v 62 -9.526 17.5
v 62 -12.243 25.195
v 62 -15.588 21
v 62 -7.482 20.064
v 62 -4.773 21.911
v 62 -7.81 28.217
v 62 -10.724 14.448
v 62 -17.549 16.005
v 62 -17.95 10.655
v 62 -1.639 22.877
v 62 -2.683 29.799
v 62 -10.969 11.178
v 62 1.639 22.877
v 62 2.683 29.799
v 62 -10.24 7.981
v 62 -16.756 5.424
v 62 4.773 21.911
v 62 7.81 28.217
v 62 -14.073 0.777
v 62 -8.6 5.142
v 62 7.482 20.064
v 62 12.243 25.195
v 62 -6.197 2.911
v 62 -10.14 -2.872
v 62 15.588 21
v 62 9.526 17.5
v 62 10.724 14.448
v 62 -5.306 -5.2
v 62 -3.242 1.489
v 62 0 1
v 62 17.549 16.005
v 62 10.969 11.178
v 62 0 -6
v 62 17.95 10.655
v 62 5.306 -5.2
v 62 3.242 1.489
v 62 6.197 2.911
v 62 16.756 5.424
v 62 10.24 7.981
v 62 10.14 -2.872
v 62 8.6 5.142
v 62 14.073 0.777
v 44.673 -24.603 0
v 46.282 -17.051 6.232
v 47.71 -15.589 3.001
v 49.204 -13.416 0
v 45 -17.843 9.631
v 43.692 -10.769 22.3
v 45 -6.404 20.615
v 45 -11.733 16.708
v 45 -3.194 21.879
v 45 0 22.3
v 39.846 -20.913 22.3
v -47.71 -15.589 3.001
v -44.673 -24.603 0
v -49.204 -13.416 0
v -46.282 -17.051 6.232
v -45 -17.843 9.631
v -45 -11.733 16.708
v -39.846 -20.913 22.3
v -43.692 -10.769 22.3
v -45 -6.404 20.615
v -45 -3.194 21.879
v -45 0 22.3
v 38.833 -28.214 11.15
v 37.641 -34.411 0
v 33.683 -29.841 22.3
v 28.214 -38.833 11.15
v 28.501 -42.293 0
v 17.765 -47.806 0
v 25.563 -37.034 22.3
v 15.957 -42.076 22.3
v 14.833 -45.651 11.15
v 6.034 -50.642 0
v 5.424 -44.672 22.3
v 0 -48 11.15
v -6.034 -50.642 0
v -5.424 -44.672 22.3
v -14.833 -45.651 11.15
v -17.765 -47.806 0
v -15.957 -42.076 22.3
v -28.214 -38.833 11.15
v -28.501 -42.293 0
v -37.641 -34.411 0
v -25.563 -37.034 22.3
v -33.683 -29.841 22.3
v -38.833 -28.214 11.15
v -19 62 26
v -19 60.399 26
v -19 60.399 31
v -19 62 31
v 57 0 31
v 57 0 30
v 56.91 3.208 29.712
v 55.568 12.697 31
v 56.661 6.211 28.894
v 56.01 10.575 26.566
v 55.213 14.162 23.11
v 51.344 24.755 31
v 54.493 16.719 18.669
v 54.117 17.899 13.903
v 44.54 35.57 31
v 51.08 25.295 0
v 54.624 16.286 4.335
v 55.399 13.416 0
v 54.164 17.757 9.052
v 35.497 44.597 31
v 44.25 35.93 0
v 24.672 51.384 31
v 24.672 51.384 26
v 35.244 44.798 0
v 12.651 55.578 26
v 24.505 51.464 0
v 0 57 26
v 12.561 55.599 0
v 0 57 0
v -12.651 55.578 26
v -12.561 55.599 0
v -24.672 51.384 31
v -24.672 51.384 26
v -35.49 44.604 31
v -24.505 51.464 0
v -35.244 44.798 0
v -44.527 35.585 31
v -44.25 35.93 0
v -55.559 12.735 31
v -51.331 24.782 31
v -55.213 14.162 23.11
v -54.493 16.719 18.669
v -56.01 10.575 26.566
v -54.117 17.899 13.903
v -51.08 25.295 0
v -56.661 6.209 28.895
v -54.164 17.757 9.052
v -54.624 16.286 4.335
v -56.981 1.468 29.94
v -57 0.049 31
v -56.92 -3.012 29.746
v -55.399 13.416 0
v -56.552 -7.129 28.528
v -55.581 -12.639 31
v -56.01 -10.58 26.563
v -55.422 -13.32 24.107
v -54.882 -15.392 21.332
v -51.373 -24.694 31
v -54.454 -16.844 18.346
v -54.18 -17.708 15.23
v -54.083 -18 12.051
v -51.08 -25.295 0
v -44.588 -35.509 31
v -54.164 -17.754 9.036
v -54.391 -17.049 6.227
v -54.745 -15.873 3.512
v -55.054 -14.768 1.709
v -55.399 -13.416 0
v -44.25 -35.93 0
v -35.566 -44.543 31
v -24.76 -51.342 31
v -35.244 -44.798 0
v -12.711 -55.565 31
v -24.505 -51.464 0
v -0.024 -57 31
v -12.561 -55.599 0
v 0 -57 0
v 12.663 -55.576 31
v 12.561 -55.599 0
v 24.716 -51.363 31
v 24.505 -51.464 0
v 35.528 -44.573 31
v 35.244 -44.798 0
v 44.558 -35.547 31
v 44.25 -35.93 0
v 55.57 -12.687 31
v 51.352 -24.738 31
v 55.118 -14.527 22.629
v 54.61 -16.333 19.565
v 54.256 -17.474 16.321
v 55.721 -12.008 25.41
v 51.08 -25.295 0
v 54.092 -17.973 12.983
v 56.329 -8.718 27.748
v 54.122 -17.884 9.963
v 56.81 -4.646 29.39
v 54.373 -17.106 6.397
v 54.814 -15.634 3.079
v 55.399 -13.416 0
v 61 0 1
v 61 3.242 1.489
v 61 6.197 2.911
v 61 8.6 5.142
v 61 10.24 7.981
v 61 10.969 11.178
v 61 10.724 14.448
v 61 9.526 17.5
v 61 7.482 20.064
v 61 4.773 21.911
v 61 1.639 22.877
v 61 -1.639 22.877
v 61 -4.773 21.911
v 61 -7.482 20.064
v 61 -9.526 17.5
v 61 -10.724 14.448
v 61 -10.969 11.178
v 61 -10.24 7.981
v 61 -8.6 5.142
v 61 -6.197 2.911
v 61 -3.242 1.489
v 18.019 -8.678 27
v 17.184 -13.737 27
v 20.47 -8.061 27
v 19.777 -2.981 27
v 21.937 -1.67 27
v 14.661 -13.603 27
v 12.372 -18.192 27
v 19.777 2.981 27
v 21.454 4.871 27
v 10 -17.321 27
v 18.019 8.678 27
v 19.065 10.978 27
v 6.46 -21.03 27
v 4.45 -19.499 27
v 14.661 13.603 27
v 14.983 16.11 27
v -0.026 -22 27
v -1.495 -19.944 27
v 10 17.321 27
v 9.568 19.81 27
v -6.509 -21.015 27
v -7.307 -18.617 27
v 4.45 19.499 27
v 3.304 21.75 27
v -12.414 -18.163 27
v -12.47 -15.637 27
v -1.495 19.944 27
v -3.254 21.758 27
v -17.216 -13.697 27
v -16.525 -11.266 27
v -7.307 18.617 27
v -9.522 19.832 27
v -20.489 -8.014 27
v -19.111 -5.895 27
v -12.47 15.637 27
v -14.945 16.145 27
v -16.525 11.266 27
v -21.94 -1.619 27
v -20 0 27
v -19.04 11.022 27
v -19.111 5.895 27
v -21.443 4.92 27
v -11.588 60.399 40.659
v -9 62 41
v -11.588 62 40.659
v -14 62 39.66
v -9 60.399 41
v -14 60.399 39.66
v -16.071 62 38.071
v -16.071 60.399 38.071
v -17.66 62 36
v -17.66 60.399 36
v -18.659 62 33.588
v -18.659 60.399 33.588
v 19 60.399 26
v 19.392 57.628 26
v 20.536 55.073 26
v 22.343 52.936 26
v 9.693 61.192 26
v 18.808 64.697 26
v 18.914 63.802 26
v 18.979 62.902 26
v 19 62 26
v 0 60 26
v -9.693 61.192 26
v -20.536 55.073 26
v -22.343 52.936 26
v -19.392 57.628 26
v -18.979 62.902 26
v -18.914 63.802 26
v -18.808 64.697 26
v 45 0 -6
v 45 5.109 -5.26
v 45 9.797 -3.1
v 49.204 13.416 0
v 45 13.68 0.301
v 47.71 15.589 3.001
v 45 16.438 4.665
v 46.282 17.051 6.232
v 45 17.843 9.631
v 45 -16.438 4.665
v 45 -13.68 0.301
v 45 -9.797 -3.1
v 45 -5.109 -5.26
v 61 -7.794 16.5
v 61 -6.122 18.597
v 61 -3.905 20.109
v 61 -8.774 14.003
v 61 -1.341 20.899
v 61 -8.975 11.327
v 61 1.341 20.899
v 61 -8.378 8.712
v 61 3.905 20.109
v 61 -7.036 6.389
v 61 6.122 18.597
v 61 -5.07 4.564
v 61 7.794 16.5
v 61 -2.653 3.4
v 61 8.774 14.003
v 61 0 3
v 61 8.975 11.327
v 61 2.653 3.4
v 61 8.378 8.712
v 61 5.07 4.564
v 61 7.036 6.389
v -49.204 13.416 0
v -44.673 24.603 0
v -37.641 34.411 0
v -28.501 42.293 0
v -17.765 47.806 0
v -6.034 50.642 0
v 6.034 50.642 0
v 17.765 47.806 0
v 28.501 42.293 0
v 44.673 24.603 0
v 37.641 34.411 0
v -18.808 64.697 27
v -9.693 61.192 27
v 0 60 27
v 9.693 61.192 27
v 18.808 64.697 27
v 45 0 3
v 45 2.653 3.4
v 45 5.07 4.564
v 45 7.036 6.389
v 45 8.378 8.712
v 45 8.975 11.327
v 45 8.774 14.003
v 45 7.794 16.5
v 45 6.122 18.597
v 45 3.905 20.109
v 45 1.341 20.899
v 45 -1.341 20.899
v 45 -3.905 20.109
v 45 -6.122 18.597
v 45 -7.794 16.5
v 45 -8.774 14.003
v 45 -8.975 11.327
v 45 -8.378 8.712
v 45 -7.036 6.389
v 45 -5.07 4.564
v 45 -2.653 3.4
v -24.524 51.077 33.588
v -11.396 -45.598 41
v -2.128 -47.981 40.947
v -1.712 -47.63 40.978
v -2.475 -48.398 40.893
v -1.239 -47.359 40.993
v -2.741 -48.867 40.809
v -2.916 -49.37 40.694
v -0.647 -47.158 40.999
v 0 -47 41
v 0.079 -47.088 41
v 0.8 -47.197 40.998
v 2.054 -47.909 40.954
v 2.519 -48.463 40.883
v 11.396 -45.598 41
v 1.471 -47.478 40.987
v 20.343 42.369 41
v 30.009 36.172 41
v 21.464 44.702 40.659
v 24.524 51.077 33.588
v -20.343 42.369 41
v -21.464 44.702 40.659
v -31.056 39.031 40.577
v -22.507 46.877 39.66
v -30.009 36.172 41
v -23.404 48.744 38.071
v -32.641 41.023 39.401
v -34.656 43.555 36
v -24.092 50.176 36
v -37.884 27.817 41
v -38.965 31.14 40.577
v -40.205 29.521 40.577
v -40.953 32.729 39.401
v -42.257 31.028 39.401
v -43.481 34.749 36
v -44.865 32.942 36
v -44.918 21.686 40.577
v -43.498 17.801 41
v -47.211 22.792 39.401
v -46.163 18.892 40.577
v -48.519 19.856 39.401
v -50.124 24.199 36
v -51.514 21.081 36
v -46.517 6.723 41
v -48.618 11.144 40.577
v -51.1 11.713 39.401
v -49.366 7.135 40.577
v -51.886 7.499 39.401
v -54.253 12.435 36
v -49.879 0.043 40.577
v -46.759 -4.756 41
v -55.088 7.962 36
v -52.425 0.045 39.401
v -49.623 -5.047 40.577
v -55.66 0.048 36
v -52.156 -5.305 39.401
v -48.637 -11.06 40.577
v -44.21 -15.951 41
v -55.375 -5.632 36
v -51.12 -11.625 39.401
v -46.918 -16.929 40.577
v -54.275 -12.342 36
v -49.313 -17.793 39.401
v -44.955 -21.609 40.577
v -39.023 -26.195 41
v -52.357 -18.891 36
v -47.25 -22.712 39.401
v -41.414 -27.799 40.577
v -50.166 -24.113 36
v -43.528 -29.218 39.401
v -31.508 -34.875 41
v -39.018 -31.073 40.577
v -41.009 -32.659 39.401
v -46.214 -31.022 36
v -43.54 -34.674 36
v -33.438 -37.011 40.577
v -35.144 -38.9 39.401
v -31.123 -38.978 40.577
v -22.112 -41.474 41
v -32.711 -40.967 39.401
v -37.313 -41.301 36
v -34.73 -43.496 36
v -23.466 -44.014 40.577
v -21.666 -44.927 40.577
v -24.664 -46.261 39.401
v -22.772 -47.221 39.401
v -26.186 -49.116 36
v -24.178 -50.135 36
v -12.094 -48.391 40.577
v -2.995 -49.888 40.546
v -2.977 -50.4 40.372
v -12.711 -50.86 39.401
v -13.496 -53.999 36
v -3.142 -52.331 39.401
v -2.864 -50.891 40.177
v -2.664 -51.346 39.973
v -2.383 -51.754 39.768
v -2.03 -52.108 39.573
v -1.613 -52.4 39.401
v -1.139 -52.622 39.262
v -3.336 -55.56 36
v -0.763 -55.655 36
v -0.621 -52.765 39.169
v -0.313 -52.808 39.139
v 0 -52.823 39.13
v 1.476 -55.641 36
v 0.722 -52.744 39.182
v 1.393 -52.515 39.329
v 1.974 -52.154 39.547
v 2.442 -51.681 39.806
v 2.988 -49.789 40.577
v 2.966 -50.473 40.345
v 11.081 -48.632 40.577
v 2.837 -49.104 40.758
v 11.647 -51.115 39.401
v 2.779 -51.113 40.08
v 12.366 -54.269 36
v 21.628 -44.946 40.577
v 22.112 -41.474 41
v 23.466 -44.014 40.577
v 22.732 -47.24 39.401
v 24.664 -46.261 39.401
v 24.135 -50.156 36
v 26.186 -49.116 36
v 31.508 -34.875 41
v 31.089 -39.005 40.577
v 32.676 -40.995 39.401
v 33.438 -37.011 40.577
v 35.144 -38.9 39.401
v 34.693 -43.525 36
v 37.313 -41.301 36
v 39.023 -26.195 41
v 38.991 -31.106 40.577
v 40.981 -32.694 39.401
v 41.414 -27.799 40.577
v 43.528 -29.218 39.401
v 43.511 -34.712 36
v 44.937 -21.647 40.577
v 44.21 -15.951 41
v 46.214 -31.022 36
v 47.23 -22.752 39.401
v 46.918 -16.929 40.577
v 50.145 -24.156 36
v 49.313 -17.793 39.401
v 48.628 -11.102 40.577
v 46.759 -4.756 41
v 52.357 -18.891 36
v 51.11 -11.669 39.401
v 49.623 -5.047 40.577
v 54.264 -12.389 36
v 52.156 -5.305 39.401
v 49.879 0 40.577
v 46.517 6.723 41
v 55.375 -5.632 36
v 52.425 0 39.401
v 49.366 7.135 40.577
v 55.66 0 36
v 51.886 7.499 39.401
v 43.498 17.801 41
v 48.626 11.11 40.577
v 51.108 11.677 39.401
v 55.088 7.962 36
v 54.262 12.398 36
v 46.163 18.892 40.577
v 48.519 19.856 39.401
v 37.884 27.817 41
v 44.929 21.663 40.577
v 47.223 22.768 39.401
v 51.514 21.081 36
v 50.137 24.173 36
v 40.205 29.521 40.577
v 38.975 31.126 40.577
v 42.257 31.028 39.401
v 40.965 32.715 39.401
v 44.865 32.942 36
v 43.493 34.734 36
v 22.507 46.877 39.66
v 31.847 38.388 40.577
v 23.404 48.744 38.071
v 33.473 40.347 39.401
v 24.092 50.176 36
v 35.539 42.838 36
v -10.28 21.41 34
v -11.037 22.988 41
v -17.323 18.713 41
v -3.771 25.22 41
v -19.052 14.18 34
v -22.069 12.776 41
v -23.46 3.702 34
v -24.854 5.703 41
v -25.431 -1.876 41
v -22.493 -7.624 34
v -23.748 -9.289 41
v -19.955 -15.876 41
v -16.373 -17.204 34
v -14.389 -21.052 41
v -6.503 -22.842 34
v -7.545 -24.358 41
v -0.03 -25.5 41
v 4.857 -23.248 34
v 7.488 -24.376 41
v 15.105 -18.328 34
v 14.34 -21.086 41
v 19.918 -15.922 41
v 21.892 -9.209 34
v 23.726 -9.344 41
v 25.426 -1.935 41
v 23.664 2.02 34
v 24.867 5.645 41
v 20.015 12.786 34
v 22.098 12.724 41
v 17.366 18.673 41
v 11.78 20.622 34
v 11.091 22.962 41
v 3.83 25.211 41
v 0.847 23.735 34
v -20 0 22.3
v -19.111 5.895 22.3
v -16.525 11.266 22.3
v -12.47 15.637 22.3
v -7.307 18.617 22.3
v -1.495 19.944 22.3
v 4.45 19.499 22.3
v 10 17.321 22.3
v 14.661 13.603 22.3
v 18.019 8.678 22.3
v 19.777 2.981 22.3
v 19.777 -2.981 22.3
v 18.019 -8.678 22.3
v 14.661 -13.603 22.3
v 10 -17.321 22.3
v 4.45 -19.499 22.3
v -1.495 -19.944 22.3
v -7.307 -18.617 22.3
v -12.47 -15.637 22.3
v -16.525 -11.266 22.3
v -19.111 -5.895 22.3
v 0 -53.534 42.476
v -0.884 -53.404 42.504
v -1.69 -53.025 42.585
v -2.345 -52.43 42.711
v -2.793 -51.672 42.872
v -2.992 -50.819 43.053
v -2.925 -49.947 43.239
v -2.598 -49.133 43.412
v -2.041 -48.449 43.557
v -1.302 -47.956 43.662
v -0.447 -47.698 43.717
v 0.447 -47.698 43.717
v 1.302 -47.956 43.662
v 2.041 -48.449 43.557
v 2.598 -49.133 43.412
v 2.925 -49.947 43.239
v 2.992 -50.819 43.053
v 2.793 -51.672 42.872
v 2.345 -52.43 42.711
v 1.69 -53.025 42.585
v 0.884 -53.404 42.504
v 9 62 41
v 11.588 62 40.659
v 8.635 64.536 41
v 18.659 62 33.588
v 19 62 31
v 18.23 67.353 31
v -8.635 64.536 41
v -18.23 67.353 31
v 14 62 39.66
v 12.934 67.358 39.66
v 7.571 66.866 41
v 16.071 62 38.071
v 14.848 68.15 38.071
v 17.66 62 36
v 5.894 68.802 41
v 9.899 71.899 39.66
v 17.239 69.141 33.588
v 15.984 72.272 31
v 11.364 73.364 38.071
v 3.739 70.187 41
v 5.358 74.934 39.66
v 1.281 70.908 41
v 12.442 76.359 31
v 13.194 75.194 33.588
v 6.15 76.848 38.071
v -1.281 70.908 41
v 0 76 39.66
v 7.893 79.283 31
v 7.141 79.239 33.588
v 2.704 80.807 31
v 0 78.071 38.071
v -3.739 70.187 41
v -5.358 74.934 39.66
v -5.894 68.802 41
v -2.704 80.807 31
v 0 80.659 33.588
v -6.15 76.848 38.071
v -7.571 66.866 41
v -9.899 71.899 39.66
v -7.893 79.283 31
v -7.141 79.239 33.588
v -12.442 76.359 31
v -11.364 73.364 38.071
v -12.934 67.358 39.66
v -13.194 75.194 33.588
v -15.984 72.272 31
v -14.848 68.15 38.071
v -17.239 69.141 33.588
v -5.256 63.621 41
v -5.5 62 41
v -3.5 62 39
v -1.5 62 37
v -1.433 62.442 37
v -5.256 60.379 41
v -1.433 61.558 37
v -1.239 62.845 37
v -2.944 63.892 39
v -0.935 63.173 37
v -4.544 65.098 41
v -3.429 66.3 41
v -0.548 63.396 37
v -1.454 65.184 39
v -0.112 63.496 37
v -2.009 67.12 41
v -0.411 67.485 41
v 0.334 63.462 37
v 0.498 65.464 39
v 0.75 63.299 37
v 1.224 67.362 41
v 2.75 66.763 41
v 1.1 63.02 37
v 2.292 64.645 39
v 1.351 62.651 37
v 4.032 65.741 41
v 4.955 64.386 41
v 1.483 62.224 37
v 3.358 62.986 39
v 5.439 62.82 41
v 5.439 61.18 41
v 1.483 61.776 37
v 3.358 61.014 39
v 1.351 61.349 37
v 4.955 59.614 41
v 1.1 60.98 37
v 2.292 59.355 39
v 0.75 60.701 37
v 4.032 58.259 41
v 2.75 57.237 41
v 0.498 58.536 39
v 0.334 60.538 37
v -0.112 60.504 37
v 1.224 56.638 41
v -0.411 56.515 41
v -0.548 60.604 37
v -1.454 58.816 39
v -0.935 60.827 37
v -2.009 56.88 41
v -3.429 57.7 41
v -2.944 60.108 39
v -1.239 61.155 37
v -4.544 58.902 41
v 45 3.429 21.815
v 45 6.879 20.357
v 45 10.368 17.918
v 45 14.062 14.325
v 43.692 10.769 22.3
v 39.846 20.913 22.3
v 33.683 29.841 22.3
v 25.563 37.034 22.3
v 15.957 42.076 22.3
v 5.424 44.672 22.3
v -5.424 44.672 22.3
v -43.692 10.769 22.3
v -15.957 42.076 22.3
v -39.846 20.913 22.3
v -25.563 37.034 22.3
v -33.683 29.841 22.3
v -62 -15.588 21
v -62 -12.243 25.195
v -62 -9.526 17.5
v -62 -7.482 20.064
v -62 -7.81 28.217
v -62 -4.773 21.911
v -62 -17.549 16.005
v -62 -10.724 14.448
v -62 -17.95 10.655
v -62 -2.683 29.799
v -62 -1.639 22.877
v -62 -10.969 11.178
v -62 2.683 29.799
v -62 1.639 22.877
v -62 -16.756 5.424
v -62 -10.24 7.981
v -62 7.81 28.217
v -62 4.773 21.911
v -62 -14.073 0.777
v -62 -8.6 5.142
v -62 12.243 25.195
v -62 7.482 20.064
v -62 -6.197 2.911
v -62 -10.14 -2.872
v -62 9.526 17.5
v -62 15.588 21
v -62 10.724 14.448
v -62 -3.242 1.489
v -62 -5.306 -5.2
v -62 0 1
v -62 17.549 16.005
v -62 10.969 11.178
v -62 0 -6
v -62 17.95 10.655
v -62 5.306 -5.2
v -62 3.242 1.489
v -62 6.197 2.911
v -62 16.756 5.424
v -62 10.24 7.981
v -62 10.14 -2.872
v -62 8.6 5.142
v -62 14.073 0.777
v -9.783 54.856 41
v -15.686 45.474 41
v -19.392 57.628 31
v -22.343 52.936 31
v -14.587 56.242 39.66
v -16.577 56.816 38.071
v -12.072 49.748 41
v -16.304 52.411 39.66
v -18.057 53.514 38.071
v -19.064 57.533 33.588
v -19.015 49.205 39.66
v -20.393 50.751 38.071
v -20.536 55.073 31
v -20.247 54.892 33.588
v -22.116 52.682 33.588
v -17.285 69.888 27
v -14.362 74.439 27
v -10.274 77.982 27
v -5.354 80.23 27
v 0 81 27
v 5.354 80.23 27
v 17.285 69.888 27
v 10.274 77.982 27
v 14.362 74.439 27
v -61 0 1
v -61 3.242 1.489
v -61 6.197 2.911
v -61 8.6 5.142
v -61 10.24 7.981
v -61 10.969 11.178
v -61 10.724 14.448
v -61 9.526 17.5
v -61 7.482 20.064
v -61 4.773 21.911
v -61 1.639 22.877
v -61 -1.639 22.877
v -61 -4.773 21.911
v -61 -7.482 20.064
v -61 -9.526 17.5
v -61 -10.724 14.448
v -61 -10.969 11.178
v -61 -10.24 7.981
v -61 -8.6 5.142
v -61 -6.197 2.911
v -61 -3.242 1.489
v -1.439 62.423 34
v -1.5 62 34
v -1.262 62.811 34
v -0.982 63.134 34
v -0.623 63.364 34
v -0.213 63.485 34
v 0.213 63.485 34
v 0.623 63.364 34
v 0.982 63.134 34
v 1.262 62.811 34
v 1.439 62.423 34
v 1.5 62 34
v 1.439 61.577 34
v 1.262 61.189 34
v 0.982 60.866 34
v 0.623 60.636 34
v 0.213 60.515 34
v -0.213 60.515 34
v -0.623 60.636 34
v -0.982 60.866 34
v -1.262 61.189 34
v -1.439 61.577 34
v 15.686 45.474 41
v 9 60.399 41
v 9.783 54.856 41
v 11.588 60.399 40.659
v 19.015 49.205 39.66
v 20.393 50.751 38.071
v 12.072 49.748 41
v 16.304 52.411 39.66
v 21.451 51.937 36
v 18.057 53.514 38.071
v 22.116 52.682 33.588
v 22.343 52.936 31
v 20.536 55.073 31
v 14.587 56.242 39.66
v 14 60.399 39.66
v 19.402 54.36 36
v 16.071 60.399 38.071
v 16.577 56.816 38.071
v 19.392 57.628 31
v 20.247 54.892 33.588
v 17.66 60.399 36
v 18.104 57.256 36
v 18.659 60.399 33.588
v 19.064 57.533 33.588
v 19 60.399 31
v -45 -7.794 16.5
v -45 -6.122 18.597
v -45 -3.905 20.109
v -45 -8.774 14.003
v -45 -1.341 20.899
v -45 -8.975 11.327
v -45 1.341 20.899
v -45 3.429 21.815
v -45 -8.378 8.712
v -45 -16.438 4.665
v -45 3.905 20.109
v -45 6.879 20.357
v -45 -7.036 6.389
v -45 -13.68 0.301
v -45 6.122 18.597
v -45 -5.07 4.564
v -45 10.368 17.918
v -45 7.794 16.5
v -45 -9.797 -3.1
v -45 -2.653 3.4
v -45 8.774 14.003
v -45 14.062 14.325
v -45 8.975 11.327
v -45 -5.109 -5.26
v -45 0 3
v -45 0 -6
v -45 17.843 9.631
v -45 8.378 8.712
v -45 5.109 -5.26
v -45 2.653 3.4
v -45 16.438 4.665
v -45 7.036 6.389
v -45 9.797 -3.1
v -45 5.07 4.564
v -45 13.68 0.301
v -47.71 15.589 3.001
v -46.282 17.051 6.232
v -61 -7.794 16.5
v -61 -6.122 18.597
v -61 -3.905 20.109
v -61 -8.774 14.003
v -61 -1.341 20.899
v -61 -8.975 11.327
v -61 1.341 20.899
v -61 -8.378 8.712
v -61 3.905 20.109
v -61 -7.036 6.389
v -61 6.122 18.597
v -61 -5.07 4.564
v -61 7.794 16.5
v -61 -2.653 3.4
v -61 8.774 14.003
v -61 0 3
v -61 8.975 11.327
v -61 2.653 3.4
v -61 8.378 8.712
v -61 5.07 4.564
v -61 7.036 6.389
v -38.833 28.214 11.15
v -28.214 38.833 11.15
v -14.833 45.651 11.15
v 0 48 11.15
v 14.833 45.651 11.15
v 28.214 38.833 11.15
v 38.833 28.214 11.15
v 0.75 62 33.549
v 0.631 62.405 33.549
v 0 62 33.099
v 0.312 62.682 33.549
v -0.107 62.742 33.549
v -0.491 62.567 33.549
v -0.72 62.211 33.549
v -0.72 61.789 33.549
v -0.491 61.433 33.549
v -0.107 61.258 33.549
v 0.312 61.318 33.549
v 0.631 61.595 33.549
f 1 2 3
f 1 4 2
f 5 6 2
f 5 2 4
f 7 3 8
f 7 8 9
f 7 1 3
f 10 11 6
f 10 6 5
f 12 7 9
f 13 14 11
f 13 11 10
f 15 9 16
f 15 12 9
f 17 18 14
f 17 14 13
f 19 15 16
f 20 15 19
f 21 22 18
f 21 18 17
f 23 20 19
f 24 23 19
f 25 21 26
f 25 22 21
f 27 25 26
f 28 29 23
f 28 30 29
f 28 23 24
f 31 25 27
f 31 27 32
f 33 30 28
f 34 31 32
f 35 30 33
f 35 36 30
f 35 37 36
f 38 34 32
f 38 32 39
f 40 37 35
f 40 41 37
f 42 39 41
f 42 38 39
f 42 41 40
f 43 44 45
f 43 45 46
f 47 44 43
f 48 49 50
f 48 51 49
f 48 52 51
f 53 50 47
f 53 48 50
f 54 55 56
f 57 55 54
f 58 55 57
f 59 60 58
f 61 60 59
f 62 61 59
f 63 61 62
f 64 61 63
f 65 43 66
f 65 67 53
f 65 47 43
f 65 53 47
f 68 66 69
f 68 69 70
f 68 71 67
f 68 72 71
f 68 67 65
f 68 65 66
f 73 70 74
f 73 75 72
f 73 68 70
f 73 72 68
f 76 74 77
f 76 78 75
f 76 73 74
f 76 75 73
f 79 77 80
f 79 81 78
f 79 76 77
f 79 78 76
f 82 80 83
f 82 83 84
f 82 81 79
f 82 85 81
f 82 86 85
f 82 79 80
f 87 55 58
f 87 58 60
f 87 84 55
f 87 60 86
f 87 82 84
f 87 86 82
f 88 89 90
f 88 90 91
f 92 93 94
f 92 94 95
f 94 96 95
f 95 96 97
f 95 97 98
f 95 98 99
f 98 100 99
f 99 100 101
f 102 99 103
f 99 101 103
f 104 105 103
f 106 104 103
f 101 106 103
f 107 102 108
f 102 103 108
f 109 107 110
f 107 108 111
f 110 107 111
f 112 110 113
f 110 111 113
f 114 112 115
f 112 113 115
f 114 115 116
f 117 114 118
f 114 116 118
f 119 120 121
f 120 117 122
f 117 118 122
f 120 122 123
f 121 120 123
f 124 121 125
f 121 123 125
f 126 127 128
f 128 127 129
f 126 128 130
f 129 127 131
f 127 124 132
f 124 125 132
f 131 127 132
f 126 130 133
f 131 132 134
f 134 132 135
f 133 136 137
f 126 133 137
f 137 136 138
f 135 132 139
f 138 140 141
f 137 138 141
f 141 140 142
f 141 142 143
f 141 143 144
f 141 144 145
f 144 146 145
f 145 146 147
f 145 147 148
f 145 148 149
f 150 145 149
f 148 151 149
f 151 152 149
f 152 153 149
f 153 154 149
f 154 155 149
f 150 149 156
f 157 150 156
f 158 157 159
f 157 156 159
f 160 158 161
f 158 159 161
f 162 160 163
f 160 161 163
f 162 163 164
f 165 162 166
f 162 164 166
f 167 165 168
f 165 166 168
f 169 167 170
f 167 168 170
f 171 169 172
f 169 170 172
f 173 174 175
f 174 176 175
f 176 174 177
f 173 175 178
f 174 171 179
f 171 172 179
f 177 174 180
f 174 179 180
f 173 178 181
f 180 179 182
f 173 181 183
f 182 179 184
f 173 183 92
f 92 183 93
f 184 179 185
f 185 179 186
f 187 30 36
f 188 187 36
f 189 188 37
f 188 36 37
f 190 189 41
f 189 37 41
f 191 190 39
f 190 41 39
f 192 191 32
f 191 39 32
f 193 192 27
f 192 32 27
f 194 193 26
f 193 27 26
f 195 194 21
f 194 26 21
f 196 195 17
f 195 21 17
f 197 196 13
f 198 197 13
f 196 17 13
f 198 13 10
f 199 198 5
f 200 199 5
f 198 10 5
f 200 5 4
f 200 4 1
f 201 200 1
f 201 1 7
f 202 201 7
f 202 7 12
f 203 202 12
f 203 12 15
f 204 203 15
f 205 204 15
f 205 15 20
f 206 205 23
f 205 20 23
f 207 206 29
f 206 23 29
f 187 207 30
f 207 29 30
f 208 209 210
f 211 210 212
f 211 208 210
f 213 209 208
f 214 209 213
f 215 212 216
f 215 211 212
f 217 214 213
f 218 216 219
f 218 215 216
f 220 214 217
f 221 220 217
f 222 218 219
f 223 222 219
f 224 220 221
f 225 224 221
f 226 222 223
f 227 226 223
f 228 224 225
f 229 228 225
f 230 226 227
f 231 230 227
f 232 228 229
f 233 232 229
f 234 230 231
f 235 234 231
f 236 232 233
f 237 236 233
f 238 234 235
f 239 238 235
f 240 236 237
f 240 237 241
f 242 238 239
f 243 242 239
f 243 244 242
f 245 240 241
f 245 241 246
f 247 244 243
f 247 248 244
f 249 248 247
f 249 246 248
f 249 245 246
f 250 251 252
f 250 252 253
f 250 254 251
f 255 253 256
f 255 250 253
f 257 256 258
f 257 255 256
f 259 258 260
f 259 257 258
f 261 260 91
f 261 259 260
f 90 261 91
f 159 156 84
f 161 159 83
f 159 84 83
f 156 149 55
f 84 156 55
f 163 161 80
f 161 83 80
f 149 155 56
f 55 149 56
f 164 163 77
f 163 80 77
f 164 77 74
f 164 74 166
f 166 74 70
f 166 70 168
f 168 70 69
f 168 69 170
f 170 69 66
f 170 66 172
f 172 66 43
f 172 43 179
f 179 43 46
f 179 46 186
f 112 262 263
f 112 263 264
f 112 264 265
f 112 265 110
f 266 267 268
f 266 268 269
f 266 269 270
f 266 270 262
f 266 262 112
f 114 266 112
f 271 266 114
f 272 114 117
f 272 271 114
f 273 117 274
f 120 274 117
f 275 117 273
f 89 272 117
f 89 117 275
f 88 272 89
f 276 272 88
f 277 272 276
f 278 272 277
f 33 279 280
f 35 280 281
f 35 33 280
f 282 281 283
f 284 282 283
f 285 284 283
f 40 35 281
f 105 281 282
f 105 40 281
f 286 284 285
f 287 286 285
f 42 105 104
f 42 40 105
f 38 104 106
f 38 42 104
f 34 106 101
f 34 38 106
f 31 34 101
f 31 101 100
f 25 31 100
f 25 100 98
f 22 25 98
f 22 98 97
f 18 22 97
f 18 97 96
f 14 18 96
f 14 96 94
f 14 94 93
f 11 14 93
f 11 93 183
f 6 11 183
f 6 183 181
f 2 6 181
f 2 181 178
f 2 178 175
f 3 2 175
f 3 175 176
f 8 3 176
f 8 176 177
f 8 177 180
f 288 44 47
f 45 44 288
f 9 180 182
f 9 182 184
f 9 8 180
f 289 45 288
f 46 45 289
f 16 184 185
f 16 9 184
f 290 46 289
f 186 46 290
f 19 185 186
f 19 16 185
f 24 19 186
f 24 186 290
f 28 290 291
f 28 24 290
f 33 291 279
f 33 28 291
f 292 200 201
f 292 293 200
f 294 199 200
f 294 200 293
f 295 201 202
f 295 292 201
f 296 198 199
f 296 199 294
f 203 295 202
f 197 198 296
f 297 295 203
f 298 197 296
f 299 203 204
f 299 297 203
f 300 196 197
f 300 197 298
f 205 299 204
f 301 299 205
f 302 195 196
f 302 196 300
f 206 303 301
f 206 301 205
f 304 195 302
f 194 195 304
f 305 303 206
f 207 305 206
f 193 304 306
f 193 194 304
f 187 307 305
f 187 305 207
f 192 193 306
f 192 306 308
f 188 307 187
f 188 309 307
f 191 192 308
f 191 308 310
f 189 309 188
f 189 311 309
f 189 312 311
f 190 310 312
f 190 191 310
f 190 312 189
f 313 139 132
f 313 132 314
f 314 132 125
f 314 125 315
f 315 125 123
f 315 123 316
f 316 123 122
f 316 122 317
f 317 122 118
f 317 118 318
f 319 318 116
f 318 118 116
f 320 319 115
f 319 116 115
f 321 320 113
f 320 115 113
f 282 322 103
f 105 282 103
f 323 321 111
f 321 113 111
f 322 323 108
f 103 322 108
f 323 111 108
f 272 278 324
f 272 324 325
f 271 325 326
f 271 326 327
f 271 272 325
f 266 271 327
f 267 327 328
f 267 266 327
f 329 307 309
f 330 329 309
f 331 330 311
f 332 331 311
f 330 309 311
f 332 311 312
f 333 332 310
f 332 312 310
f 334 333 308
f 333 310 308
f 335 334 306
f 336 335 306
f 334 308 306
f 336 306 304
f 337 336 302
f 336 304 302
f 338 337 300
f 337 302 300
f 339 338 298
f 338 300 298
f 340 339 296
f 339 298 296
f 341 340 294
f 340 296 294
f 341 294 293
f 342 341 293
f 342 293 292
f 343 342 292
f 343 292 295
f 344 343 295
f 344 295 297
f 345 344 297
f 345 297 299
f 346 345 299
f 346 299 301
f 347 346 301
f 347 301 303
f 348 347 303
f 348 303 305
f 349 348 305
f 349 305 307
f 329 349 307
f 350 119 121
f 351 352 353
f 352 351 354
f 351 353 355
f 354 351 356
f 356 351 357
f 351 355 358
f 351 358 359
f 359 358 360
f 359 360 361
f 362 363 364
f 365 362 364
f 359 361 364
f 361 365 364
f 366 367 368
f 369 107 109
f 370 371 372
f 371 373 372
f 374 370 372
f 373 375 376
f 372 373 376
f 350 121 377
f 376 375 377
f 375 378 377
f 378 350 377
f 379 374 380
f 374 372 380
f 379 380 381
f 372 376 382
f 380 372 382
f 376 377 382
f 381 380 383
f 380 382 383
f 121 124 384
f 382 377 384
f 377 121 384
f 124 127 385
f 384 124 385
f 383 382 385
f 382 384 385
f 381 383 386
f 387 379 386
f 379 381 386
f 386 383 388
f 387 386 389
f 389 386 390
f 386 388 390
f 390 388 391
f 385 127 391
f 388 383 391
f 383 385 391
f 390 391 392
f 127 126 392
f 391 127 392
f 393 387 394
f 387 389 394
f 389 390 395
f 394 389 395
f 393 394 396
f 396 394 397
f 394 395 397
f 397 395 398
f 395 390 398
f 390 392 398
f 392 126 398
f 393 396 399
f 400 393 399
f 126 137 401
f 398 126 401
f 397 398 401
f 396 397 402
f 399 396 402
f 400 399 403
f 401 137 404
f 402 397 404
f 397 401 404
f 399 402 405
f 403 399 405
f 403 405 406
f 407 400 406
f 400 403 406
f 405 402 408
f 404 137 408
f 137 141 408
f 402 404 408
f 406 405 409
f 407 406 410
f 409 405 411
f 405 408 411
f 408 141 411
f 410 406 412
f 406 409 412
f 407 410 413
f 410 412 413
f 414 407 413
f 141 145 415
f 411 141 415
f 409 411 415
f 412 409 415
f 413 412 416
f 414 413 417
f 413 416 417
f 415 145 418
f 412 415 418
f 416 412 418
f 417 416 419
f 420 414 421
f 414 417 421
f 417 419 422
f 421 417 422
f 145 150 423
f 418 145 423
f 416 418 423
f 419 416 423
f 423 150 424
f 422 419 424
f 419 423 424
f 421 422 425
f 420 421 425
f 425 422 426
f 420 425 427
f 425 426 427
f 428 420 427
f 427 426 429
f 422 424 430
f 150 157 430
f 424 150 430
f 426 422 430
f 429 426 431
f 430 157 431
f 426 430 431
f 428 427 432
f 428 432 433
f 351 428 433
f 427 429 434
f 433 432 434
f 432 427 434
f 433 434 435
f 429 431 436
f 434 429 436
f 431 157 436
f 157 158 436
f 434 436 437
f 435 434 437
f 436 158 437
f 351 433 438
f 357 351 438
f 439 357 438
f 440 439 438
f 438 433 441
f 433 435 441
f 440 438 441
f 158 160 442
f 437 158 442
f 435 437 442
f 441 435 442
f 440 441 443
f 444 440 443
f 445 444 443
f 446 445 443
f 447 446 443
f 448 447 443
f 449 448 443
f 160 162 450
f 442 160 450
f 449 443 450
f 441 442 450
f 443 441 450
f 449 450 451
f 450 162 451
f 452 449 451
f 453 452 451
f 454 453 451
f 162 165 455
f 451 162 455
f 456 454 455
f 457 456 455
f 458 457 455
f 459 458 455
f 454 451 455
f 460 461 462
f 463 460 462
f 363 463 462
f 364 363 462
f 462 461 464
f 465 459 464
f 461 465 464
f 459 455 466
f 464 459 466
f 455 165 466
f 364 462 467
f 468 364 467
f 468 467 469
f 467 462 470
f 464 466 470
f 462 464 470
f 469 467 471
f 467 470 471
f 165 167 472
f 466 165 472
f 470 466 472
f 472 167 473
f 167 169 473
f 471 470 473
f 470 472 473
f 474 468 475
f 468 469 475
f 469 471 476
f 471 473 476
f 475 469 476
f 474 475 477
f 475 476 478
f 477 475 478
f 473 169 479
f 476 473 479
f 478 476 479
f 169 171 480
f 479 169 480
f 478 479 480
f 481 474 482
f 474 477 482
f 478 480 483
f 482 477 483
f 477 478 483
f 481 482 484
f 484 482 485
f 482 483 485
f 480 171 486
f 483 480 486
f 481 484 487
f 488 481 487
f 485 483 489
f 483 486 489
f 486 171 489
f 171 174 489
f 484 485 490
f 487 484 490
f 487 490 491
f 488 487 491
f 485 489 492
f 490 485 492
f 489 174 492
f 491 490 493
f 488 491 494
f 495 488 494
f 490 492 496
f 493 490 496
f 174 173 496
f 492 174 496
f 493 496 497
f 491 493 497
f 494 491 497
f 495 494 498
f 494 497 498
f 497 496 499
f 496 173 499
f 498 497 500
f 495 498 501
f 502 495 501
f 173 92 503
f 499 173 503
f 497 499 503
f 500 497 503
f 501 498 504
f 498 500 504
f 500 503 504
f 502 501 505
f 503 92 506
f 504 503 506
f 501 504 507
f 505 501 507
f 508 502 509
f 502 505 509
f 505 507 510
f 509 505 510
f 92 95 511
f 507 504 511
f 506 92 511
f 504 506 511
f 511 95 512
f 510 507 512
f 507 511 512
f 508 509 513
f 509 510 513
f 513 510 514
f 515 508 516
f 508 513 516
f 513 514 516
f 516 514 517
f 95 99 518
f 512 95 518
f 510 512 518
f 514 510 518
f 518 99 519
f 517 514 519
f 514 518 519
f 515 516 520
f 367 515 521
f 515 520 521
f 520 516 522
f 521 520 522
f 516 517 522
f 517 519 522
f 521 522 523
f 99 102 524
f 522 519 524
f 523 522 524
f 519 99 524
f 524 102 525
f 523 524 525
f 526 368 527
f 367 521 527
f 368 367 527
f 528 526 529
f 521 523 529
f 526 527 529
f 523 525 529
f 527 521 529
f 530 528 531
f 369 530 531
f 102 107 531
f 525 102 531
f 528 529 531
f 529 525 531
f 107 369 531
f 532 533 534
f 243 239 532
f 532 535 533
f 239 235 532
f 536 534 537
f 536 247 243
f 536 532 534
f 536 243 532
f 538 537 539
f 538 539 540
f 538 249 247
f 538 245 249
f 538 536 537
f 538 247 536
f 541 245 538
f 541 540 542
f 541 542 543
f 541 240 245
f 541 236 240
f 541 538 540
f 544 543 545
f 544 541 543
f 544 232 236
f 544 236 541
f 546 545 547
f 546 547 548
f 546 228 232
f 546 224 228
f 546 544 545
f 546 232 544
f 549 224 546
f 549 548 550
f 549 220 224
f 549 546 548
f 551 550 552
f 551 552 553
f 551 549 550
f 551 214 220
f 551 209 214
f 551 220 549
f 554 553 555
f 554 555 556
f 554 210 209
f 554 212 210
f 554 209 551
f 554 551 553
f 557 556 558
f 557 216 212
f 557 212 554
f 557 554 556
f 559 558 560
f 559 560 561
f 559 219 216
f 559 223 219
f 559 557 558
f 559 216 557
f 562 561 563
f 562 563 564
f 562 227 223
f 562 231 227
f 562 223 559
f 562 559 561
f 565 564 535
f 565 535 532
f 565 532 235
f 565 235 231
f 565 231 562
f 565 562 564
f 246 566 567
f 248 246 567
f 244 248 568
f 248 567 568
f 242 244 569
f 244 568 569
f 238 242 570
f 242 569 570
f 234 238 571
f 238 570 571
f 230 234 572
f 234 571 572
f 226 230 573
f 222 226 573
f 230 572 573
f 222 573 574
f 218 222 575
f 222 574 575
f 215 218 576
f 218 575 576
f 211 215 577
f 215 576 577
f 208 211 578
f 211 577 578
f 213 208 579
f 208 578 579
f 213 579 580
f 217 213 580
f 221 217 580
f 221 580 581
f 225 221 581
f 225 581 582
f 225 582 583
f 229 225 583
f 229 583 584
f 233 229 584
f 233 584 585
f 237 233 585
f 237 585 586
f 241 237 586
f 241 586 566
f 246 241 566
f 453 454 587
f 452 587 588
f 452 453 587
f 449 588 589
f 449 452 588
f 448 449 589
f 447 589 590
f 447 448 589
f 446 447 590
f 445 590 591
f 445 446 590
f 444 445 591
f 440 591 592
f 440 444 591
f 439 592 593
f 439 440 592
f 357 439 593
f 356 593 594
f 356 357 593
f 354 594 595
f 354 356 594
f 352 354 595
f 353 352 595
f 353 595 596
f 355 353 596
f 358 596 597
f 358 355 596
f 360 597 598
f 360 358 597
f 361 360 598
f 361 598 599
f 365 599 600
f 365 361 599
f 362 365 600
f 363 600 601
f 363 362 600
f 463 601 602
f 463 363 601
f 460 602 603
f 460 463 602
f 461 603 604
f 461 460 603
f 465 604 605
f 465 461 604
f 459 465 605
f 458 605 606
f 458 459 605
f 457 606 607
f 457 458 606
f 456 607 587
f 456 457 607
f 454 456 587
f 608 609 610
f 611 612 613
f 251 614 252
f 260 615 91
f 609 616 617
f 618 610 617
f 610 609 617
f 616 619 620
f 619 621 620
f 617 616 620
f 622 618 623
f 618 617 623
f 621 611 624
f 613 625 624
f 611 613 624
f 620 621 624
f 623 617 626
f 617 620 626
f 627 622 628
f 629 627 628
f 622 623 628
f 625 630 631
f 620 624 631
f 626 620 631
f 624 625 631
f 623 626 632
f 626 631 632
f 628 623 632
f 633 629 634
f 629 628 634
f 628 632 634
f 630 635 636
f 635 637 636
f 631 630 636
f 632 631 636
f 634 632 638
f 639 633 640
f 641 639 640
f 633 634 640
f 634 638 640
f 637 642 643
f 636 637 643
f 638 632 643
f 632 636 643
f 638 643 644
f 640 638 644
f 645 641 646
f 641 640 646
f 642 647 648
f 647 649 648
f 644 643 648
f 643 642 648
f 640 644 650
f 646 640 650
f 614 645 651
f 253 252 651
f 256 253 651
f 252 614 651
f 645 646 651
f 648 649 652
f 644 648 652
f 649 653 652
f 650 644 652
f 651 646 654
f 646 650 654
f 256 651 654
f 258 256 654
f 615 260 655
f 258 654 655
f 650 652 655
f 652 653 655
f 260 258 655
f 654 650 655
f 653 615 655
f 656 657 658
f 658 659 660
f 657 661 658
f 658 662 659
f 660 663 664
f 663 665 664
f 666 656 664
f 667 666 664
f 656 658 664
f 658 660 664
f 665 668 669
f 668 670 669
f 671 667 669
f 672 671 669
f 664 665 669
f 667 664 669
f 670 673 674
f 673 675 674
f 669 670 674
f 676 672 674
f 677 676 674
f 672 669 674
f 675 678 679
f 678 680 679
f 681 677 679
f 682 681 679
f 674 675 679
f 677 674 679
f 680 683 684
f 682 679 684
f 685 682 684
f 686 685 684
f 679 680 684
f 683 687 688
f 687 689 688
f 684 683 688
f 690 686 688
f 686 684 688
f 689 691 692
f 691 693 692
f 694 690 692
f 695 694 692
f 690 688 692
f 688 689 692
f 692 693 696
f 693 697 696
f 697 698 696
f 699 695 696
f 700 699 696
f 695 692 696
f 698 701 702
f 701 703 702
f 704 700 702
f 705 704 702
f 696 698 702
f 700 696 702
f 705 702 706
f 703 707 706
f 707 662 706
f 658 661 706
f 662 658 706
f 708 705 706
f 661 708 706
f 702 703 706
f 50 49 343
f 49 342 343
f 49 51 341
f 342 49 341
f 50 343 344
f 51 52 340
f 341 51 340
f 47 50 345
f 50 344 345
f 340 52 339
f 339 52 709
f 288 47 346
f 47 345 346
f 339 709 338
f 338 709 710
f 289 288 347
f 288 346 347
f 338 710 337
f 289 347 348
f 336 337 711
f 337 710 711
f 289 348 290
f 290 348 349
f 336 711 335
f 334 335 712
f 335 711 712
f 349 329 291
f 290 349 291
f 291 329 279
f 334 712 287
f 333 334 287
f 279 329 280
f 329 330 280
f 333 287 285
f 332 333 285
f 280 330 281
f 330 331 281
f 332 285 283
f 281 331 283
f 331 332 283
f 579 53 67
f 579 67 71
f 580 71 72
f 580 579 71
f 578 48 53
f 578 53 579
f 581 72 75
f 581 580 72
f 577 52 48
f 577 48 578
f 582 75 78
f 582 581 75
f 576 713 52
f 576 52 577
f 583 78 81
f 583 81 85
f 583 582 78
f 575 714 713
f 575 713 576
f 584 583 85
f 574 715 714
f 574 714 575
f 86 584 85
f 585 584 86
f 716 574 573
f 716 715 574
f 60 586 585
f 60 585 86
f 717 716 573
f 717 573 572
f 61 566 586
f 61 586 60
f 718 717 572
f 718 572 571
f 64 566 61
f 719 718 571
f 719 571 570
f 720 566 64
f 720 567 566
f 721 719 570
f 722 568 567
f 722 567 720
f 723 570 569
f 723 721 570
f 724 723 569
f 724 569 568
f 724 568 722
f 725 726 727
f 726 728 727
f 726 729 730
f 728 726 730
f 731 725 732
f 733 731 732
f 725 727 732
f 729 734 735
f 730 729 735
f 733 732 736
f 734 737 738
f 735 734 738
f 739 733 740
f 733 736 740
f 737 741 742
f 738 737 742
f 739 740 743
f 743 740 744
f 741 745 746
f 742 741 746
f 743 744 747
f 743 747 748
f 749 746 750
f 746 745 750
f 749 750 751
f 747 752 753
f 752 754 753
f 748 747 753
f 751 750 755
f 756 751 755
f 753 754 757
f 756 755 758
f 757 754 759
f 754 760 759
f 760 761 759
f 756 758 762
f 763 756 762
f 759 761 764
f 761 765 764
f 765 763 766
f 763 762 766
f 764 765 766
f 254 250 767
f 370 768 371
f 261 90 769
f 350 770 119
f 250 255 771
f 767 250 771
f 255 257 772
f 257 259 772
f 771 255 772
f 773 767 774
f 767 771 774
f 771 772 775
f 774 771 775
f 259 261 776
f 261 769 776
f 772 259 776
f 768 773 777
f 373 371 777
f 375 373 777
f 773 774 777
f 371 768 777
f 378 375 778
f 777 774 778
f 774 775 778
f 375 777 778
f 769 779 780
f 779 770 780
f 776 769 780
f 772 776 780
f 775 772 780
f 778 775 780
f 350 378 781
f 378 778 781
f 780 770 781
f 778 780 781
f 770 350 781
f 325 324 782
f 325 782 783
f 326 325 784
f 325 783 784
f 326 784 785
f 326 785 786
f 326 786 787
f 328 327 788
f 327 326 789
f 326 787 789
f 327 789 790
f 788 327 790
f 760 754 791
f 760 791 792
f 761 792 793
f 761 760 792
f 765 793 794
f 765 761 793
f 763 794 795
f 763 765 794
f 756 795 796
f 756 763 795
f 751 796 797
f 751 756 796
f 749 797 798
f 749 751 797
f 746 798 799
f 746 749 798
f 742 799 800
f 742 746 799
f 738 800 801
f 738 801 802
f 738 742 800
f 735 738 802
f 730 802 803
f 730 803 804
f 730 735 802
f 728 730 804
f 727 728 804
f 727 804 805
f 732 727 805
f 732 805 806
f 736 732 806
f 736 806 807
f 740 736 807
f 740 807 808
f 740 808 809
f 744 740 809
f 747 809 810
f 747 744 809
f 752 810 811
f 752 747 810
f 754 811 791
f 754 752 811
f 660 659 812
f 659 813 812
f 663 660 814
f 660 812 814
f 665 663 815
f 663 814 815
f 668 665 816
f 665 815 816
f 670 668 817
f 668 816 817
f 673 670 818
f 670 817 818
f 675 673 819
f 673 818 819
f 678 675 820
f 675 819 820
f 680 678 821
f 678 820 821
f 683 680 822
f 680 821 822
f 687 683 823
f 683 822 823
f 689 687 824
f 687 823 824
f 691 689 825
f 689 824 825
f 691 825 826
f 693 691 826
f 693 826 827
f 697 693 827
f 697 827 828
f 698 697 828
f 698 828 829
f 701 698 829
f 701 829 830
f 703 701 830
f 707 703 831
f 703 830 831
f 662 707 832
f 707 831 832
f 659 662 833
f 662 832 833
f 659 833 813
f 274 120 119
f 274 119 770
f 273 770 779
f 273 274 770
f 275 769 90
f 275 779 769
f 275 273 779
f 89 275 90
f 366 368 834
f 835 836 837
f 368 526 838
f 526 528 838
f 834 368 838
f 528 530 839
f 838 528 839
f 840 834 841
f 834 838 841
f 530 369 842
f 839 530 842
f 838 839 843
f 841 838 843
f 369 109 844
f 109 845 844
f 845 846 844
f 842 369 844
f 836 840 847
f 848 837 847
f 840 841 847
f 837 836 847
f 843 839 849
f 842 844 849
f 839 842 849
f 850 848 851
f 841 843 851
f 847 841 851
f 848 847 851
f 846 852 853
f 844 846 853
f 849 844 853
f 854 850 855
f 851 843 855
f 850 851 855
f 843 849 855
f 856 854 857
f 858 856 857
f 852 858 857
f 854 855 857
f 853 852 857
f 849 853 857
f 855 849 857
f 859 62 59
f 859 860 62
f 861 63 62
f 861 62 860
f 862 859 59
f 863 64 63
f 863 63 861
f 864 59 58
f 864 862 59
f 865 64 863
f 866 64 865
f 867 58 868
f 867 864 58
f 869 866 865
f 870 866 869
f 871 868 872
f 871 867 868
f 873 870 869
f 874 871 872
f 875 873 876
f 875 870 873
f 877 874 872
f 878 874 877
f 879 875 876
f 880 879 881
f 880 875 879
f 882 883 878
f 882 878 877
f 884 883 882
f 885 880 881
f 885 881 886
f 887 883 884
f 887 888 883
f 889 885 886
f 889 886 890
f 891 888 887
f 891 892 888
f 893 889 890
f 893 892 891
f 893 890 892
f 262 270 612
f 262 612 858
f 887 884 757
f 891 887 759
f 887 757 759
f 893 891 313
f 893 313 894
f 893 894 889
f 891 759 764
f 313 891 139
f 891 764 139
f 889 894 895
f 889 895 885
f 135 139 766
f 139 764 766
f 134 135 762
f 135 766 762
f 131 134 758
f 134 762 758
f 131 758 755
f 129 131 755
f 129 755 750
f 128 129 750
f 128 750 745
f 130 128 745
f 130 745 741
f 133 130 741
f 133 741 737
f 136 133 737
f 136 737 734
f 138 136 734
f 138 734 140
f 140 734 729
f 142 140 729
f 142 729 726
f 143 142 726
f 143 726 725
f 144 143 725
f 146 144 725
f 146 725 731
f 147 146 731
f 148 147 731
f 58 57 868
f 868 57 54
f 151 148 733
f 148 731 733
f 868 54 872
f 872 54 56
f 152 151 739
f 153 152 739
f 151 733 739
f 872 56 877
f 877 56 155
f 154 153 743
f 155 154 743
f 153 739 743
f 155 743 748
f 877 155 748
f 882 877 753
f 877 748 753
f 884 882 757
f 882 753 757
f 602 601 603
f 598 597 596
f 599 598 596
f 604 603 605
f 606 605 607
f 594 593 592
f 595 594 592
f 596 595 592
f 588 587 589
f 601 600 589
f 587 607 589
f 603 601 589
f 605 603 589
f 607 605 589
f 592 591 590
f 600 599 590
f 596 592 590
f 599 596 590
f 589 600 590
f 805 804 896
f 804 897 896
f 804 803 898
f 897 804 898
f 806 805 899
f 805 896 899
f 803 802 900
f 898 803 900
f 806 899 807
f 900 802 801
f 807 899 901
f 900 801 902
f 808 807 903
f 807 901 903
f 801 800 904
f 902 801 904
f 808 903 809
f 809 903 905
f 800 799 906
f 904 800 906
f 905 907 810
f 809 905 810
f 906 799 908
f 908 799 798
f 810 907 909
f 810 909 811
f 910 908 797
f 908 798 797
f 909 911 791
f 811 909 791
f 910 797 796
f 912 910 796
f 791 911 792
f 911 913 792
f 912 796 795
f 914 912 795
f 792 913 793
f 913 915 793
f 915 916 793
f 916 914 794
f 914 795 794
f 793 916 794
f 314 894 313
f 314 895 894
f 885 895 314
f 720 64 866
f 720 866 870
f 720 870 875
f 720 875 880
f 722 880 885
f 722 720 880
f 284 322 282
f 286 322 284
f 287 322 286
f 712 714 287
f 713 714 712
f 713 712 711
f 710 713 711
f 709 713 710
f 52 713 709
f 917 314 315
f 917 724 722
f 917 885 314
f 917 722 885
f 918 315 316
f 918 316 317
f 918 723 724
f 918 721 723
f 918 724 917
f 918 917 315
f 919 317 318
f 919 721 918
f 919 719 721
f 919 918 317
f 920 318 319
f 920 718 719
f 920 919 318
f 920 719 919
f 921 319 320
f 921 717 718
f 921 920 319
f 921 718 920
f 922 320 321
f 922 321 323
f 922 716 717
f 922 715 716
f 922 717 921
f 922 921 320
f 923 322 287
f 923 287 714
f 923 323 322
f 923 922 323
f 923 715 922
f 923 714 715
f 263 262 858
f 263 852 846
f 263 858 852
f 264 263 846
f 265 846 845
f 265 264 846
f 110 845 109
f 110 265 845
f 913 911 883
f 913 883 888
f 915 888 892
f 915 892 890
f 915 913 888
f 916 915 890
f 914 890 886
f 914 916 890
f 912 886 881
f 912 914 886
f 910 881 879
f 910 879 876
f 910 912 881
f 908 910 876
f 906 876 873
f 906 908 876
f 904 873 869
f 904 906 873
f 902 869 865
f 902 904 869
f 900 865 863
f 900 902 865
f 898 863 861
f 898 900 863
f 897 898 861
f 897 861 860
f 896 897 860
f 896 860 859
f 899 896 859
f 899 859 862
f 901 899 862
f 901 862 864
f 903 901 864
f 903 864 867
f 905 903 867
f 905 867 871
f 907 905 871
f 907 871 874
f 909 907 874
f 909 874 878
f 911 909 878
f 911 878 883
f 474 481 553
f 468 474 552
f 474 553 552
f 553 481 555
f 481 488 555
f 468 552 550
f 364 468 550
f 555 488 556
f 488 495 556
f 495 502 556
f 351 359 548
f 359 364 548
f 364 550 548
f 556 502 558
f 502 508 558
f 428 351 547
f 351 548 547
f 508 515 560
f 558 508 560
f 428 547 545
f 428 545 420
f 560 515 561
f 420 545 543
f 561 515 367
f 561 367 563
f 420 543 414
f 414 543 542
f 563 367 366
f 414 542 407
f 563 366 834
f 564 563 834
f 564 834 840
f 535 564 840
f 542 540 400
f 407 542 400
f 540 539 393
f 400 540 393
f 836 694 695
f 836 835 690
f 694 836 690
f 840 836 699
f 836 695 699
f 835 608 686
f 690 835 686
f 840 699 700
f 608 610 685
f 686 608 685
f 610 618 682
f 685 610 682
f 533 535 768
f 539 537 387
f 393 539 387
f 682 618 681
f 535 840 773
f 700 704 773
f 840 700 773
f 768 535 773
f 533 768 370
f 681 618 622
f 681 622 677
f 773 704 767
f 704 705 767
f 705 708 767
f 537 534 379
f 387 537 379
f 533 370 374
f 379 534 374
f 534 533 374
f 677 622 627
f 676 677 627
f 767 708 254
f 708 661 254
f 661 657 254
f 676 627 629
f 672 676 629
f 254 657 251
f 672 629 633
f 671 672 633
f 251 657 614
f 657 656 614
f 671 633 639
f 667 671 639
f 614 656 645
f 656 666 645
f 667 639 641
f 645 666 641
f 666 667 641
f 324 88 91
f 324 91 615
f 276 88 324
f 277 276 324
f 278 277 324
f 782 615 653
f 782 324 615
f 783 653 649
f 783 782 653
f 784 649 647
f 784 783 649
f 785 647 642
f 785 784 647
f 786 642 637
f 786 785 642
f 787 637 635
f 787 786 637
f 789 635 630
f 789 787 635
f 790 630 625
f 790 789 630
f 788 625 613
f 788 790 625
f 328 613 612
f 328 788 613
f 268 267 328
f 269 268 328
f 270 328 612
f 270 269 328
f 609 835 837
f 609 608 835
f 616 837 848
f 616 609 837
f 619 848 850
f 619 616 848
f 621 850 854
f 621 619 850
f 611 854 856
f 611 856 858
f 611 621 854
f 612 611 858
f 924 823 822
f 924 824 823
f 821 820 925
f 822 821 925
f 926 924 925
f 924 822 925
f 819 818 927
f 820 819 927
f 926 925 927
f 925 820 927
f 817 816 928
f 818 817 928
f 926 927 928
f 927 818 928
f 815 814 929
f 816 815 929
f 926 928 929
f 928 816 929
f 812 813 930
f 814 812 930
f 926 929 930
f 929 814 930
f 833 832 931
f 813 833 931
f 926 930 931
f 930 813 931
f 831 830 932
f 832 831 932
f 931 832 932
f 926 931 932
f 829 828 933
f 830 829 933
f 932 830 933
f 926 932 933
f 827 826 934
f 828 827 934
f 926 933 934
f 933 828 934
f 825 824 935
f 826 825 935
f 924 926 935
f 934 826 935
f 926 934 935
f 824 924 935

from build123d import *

# Parameters (mm, degrees)
SKETCH_1_R            = 57
EXTRUDE_1_DEPTH       = 41
EXTRUDE_START         = -15
EXTRUDE_3_DEPTH       = 15
SKETCH_5_R            = 40
CUT_EXTRUDE_1_DEPTH   = 1
SKETCH_6_R            = 51
SKETCH_7_R            = 45
SKETCH_8_R            = 20
CUT_EXTRUDE_2_DEPTH   = 102.524824572
F_3_0MM_1_D           = 3
F_3_0MM_1_DEPTH       = 7
F_3_0MM_1_CSINK_D     = 11
F_3_0MM_1_CSINK_ANGLE = 90
F_3_0MM_1_TIP         = 0.901290929
FILLET_2_R            = 10
EXTRUDE_START_2       = 62
SKETCH_14_R           = 18
EXTRUDE_4_DEPTH       = 17
SKETCH_15_R           = 11
CUT_EXTRUDE_3_DEPTH   = 1
CUT_EXTRUDE_4_REACH   = 150.883
SKETCH_16_R           = 9
SWEEP_1_PROFILE_R     = 3


with BuildPart() as part:
    # 草图1 → 凸台-拉伸1 (new body)
    with BuildSketch(Plane.XY):
        Circle(SKETCH_1_R)
    extrude(amount=EXTRUDE_1_DEPTH)

    # 草图4 → 凸台-拉伸3 (add)
    with BuildSketch(Plane.XY.offset(41).offset(EXTRUDE_START)):
        with BuildLine():
            Line((19, 62), (19, 60.398675482))
            ThreePointArc((19, 60.398675482), (20.53585261, 55.073432863), (24.671641791, 51.383947798))
            ThreePointArc((24.671641791, 51.383947798), (0, -57), (-24.671641791, 51.383947798))
            ThreePointArc((-24.671641791, 51.383947798), (-20.53585261, 55.073432863), (-19, 60.398675482))
            Line((-19, 60.398675482), (-19, 62))
            ThreePointArc((-19, 62), (0, 81), (19, 62))
        make_face()
    extrude(amount=EXTRUDE_3_DEPTH)

    # 草图5 → 切除-拉伸1 (cut)
    with BuildSketch(Plane.XY.offset(26)):
        with Locations((0, 100)):
            Circle(SKETCH_5_R)
    extrude(amount=CUT_EXTRUDE_1_DEPTH, mode=Mode.SUBTRACT)

    # 草图6 → 切除-放样1 section 0
    with BuildSketch(Plane(origin=(0, 0, 0), x_dir=(-1, 0, 0), z_dir=(0, 0, -1))):
        Circle(SKETCH_6_R)
    # 草图7 → 切除-放样1 section 1
    with BuildSketch(Plane(origin=(0, 0, 22.3), x_dir=(-1, 0, 0), z_dir=(0, 0, -1))):
        Circle(SKETCH_7_R)
    loft(mode=Mode.SUBTRACT)

    # 草图8 → 切除-拉伸2 (cut, through all)
    with BuildSketch(Plane(origin=(0, 0, 22.3), x_dir=(-1, 0, 0), z_dir=(0, 0, -1))):
        Circle(SKETCH_8_R)
    extrude(amount=-CUT_EXTRUDE_2_DEPTH, mode=Mode.SUBTRACT)

    # 草图10 → 切除-旋转1 (revolve, cut)
    with BuildSketch(Plane(origin=(0, 0, 0), x_dir=(0, 0, -1), z_dir=(1, 0, 0)), mode=Mode.PRIVATE) as cut_revolve_1_sk:
        Polygon((-41, 0), (-41, 25.5), (-27, 22), (-27, 0), align=None)
    revolve(cut_revolve_1_sk.sketch.rotate(Axis((0, 0, 0), (0, 0, 1)), 25.647663546), axis=Axis((0, 0, 0), (0, 0, 1)), mode=Mode.SUBTRACT)

    # Ø3.0mm 暗销孔1
    with Locations(Plane.XY.offset(41)):
        with Locations((0, 62)):
            CounterSinkHole(F_3_0MM_1_D / 2, F_3_0MM_1_CSINK_D / 2, depth=F_3_0MM_1_DEPTH, counter_sink_angle=F_3_0MM_1_CSINK_ANGLE)
            with Locations((0, 0, -(F_3_0MM_1_DEPTH + F_3_0MM_1_TIP / 2))):  # 118° drill point
                Cone(0, F_3_0MM_1_D / 2, F_3_0MM_1_TIP, mode=Mode.SUBTRACT)

    # 圆角2
    fillet_2_edges = [part.edges().sort_by_distance(p)[0] for p in [
        (-30.35388293, -48.245640125, 41),
        (20.53585261, 55.073432863, 41),
        (19, 61.199337741, 41),
        (0, 81, 41),
        (-19, 61.199337741, 41),
        (-20.53585261, 55.073432863, 41),
    ]]
    fillet(fillet_2_edges, radius=FILLET_2_R)

    # 草图14 → 凸台-拉伸4 (add)
    with BuildSketch(Plane(origin=(0, 0, 0), x_dir=(0, 0, -1), z_dir=(1, 0, 0)).offset(EXTRUDE_START_2)):
        with Locations((-12, 0)):
            Circle(SKETCH_14_R)
    extrude_4 = extrude(amount=-EXTRUDE_4_DEPTH)

    # 草图15 → 切除-拉伸3 (cut)
    with BuildSketch(Plane(origin=(62, 0, 0), x_dir=(0, 0, -1), z_dir=(1, 0, 0))):
        with Locations((-12, 0)):
            Circle(SKETCH_15_R)
    cut_extrude_3 = extrude(amount=-CUT_EXTRUDE_3_DEPTH, mode=Mode.SUBTRACT)

    # 草图16 → 切除-拉伸4 (cut, up to next)
    with BuildSketch(Plane(origin=(61, 0, 0), x_dir=(0, 0, -1), z_dir=(1, 0, 0)), mode=Mode.PRIVATE) as cut_extrude_4_sk1:
        with Locations((-12, 0)):
            Circle(SKETCH_16_R)
    cut_extrude_4_tool1 = extrude(cut_extrude_4_sk1.sketch, amount=-CUT_EXTRUDE_4_REACH, mode=Mode.PRIVATE) & part.part
    cut_extrude_4 = cut_extrude_4_tool1.solids().sort_by_distance((61, 0, 12))[0]
    add(cut_extrude_4, mode=Mode.SUBTRACT)

    # 镜向2: 凸台-拉伸4, 切除-拉伸3, 切除-拉伸4 across plane
    add(extrude_4.mirror(Plane(origin=(0, 0, 0), x_dir=(0, 0, 1), z_dir=(1, 0, 0))))
    add(cut_extrude_3.mirror(Plane(origin=(0, 0, 0), x_dir=(0, 0, 1), z_dir=(1, 0, 0))), mode=Mode.SUBTRACT)
    add(cut_extrude_4.mirror(Plane(origin=(0, 0, 0), x_dir=(0, 0, 1), z_dir=(1, 0, 0))), mode=Mode.SUBTRACT)

    # 扫描1: sweep along a path in 草图17
    with BuildLine(Plane(origin=(0, 0, 0), x_dir=(0, 0, -1), z_dir=(1, 0, 0))) as sweep_1_path:
        Line((-43.1, -50.6), (-35.054731359, -48.88992536))
    # 扫描1 profile (on start of the path) → 扫描1 (sweep)
    with BuildSketch(Plane(origin=(0, -50.6, 43.1), x_dir=(0, -0.9781476007338048, -0.20791169081776342), z_dir=(0, 0.20791169081776342, -0.9781476007338048))):
        Circle(SWEEP_1_PROFILE_R)
    sweep(path=sweep_1_path.line)


solid = part.part
